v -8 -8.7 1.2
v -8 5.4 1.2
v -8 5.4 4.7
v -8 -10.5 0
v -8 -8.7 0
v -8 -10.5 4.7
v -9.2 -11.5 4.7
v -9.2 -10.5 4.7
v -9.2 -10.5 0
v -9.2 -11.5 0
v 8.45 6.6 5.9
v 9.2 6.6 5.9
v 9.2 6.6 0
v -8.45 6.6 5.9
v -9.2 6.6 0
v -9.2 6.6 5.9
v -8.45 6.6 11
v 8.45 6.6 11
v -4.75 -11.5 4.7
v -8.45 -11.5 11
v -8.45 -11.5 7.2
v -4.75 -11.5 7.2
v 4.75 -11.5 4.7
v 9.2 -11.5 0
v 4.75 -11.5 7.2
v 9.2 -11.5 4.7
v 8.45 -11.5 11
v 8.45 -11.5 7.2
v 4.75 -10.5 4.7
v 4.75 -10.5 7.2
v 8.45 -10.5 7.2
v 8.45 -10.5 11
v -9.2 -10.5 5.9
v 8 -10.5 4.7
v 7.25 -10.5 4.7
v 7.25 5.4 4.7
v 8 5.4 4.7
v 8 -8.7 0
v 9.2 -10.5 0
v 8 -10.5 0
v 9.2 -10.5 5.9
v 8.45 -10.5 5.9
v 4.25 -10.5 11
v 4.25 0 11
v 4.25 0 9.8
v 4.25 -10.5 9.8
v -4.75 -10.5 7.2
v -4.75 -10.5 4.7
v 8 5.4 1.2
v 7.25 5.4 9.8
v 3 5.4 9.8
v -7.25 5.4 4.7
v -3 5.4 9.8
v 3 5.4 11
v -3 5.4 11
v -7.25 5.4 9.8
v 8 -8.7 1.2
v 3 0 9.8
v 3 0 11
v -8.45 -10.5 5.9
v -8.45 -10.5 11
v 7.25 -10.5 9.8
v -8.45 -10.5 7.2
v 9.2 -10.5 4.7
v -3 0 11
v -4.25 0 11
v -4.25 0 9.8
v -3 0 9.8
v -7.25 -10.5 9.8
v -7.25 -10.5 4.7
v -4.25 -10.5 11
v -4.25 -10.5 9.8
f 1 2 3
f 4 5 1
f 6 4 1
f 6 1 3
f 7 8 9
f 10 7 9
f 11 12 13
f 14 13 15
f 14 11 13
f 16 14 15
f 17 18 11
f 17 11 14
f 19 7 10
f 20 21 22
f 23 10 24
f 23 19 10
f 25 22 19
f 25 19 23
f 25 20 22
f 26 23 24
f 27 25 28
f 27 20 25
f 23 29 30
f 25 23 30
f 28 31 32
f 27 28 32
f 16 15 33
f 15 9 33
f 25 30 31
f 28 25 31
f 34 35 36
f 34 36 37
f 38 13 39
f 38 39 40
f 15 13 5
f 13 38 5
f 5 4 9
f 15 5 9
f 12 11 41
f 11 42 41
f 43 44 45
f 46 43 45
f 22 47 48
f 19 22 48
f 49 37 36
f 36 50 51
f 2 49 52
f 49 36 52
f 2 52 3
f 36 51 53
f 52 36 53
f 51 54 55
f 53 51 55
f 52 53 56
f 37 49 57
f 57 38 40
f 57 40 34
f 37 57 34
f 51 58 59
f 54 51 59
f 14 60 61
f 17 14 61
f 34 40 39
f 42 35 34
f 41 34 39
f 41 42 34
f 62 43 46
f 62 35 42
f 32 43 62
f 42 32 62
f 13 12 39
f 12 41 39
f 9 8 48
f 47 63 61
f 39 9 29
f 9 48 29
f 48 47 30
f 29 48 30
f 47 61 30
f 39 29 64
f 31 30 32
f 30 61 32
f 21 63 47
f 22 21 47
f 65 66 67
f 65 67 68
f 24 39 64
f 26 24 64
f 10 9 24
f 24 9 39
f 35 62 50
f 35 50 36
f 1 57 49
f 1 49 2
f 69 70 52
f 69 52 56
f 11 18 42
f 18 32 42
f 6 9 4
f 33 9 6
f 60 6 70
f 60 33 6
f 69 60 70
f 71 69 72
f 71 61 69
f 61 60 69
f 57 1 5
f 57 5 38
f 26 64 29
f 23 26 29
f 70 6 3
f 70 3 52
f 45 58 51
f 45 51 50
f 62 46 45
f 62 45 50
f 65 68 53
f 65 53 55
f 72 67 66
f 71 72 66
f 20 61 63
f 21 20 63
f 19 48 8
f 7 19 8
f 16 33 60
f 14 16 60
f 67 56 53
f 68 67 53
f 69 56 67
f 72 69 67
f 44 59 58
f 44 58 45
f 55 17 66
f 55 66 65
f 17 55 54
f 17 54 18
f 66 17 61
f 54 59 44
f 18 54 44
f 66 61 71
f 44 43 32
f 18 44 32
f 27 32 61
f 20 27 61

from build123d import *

# Parameters (mm, degrees)
F1_DEPTH = 10.5
F0_W     = 1.25
F0_H     = 1.2
F2_DEPTH = 5.4
F4_DEPTH = 1.2
F5_W     = 16
F5_H     = 1.2
F6_DEPTH = 1.8
F8_DEPTH = 1


with BuildPart() as f1:
    # F0 (on Front) → F1 (new body)
    with BuildSketch(Plane.XZ):
        Polygon((-9.2, 5.9), (-9.2, 0), (9.2, 0), (9.2, 5.9), (8.45, 5.9), (8.45, 11), (4.25, 11), (4.25, 9.8), (7.25, 9.8), (7.25, 4.7), (8, 4.7), (8, 1.2), (-8, 1.2), (-8, 4.7), (-7.25, 4.7), (-7.25, 9.8), (-4.25, 9.8), (-4.25, 11), (-8.45, 11), (-8.45, 5.9), align=None)
    extrude(amount=F1_DEPTH)

    # F0 (on Front) → F2 (join)
    with BuildSketch(Plane.XZ):
        with Locations((3.625, 10.4)):
            Rectangle(F0_W, F0_H)
        Polygon((-9.2, 5.9), (-9.2, 0), (9.2, 0), (9.2, 5.9), (8.45, 5.9), (8.45, 11), (4.25, 11), (4.25, 9.8), (7.25, 9.8), (7.25, 4.7), (8, 4.7), (8, 1.2), (-8, 1.2), (-8, 4.7), (-7.25, 4.7), (-7.25, 9.8), (-4.25, 9.8), (-4.25, 11), (-8.45, 11), (-8.45, 5.9), align=None)
        with Locations((-3.625, 10.4)):
            Rectangle(F0_W, F0_H)
    extrude(amount=-F2_DEPTH)

    # F3 (on face) → F4 (join)
    with BuildSketch(Plane(origin=(0, 5.4, 0), x_dir=(-1, 0, 0), z_dir=(0, 1, 0))):
        Polygon((8.45, 11), (-8.45, 11), (-8.45, 5.9), (-9.2, 5.9), (-9.2, 0), (9.2, 0), (9.2, 5.9), (8.45, 5.9), align=None)
    extrude(amount=F4_DEPTH)

    # F5 (on face) → F6 (cut)
    with BuildSketch(Plane.XZ.offset(10.5)):
        with Locations((0, 0.6)):
            Rectangle(F5_W, F5_H)
    extrude(amount=-F6_DEPTH, mode=Mode.SUBTRACT)


with BuildPart() as f8:
    # F7 (on face) → F8 (new body)
    with BuildSketch(Plane.XZ.offset(10.5)):
        Polygon((4.75, 7.2), (8.45, 7.2), (8.45, 11), (-8.45, 11), (-8.45, 7.2), (-4.75, 7.2), (-4.75, 4.7), (-9.2, 4.7), (-9.2, 0), (9.2, 0), (9.2, 4.7), (4.75, 4.7), align=None)
    extrude(amount=F8_DEPTH)


solid = Compound([f1.part, f8.part])
